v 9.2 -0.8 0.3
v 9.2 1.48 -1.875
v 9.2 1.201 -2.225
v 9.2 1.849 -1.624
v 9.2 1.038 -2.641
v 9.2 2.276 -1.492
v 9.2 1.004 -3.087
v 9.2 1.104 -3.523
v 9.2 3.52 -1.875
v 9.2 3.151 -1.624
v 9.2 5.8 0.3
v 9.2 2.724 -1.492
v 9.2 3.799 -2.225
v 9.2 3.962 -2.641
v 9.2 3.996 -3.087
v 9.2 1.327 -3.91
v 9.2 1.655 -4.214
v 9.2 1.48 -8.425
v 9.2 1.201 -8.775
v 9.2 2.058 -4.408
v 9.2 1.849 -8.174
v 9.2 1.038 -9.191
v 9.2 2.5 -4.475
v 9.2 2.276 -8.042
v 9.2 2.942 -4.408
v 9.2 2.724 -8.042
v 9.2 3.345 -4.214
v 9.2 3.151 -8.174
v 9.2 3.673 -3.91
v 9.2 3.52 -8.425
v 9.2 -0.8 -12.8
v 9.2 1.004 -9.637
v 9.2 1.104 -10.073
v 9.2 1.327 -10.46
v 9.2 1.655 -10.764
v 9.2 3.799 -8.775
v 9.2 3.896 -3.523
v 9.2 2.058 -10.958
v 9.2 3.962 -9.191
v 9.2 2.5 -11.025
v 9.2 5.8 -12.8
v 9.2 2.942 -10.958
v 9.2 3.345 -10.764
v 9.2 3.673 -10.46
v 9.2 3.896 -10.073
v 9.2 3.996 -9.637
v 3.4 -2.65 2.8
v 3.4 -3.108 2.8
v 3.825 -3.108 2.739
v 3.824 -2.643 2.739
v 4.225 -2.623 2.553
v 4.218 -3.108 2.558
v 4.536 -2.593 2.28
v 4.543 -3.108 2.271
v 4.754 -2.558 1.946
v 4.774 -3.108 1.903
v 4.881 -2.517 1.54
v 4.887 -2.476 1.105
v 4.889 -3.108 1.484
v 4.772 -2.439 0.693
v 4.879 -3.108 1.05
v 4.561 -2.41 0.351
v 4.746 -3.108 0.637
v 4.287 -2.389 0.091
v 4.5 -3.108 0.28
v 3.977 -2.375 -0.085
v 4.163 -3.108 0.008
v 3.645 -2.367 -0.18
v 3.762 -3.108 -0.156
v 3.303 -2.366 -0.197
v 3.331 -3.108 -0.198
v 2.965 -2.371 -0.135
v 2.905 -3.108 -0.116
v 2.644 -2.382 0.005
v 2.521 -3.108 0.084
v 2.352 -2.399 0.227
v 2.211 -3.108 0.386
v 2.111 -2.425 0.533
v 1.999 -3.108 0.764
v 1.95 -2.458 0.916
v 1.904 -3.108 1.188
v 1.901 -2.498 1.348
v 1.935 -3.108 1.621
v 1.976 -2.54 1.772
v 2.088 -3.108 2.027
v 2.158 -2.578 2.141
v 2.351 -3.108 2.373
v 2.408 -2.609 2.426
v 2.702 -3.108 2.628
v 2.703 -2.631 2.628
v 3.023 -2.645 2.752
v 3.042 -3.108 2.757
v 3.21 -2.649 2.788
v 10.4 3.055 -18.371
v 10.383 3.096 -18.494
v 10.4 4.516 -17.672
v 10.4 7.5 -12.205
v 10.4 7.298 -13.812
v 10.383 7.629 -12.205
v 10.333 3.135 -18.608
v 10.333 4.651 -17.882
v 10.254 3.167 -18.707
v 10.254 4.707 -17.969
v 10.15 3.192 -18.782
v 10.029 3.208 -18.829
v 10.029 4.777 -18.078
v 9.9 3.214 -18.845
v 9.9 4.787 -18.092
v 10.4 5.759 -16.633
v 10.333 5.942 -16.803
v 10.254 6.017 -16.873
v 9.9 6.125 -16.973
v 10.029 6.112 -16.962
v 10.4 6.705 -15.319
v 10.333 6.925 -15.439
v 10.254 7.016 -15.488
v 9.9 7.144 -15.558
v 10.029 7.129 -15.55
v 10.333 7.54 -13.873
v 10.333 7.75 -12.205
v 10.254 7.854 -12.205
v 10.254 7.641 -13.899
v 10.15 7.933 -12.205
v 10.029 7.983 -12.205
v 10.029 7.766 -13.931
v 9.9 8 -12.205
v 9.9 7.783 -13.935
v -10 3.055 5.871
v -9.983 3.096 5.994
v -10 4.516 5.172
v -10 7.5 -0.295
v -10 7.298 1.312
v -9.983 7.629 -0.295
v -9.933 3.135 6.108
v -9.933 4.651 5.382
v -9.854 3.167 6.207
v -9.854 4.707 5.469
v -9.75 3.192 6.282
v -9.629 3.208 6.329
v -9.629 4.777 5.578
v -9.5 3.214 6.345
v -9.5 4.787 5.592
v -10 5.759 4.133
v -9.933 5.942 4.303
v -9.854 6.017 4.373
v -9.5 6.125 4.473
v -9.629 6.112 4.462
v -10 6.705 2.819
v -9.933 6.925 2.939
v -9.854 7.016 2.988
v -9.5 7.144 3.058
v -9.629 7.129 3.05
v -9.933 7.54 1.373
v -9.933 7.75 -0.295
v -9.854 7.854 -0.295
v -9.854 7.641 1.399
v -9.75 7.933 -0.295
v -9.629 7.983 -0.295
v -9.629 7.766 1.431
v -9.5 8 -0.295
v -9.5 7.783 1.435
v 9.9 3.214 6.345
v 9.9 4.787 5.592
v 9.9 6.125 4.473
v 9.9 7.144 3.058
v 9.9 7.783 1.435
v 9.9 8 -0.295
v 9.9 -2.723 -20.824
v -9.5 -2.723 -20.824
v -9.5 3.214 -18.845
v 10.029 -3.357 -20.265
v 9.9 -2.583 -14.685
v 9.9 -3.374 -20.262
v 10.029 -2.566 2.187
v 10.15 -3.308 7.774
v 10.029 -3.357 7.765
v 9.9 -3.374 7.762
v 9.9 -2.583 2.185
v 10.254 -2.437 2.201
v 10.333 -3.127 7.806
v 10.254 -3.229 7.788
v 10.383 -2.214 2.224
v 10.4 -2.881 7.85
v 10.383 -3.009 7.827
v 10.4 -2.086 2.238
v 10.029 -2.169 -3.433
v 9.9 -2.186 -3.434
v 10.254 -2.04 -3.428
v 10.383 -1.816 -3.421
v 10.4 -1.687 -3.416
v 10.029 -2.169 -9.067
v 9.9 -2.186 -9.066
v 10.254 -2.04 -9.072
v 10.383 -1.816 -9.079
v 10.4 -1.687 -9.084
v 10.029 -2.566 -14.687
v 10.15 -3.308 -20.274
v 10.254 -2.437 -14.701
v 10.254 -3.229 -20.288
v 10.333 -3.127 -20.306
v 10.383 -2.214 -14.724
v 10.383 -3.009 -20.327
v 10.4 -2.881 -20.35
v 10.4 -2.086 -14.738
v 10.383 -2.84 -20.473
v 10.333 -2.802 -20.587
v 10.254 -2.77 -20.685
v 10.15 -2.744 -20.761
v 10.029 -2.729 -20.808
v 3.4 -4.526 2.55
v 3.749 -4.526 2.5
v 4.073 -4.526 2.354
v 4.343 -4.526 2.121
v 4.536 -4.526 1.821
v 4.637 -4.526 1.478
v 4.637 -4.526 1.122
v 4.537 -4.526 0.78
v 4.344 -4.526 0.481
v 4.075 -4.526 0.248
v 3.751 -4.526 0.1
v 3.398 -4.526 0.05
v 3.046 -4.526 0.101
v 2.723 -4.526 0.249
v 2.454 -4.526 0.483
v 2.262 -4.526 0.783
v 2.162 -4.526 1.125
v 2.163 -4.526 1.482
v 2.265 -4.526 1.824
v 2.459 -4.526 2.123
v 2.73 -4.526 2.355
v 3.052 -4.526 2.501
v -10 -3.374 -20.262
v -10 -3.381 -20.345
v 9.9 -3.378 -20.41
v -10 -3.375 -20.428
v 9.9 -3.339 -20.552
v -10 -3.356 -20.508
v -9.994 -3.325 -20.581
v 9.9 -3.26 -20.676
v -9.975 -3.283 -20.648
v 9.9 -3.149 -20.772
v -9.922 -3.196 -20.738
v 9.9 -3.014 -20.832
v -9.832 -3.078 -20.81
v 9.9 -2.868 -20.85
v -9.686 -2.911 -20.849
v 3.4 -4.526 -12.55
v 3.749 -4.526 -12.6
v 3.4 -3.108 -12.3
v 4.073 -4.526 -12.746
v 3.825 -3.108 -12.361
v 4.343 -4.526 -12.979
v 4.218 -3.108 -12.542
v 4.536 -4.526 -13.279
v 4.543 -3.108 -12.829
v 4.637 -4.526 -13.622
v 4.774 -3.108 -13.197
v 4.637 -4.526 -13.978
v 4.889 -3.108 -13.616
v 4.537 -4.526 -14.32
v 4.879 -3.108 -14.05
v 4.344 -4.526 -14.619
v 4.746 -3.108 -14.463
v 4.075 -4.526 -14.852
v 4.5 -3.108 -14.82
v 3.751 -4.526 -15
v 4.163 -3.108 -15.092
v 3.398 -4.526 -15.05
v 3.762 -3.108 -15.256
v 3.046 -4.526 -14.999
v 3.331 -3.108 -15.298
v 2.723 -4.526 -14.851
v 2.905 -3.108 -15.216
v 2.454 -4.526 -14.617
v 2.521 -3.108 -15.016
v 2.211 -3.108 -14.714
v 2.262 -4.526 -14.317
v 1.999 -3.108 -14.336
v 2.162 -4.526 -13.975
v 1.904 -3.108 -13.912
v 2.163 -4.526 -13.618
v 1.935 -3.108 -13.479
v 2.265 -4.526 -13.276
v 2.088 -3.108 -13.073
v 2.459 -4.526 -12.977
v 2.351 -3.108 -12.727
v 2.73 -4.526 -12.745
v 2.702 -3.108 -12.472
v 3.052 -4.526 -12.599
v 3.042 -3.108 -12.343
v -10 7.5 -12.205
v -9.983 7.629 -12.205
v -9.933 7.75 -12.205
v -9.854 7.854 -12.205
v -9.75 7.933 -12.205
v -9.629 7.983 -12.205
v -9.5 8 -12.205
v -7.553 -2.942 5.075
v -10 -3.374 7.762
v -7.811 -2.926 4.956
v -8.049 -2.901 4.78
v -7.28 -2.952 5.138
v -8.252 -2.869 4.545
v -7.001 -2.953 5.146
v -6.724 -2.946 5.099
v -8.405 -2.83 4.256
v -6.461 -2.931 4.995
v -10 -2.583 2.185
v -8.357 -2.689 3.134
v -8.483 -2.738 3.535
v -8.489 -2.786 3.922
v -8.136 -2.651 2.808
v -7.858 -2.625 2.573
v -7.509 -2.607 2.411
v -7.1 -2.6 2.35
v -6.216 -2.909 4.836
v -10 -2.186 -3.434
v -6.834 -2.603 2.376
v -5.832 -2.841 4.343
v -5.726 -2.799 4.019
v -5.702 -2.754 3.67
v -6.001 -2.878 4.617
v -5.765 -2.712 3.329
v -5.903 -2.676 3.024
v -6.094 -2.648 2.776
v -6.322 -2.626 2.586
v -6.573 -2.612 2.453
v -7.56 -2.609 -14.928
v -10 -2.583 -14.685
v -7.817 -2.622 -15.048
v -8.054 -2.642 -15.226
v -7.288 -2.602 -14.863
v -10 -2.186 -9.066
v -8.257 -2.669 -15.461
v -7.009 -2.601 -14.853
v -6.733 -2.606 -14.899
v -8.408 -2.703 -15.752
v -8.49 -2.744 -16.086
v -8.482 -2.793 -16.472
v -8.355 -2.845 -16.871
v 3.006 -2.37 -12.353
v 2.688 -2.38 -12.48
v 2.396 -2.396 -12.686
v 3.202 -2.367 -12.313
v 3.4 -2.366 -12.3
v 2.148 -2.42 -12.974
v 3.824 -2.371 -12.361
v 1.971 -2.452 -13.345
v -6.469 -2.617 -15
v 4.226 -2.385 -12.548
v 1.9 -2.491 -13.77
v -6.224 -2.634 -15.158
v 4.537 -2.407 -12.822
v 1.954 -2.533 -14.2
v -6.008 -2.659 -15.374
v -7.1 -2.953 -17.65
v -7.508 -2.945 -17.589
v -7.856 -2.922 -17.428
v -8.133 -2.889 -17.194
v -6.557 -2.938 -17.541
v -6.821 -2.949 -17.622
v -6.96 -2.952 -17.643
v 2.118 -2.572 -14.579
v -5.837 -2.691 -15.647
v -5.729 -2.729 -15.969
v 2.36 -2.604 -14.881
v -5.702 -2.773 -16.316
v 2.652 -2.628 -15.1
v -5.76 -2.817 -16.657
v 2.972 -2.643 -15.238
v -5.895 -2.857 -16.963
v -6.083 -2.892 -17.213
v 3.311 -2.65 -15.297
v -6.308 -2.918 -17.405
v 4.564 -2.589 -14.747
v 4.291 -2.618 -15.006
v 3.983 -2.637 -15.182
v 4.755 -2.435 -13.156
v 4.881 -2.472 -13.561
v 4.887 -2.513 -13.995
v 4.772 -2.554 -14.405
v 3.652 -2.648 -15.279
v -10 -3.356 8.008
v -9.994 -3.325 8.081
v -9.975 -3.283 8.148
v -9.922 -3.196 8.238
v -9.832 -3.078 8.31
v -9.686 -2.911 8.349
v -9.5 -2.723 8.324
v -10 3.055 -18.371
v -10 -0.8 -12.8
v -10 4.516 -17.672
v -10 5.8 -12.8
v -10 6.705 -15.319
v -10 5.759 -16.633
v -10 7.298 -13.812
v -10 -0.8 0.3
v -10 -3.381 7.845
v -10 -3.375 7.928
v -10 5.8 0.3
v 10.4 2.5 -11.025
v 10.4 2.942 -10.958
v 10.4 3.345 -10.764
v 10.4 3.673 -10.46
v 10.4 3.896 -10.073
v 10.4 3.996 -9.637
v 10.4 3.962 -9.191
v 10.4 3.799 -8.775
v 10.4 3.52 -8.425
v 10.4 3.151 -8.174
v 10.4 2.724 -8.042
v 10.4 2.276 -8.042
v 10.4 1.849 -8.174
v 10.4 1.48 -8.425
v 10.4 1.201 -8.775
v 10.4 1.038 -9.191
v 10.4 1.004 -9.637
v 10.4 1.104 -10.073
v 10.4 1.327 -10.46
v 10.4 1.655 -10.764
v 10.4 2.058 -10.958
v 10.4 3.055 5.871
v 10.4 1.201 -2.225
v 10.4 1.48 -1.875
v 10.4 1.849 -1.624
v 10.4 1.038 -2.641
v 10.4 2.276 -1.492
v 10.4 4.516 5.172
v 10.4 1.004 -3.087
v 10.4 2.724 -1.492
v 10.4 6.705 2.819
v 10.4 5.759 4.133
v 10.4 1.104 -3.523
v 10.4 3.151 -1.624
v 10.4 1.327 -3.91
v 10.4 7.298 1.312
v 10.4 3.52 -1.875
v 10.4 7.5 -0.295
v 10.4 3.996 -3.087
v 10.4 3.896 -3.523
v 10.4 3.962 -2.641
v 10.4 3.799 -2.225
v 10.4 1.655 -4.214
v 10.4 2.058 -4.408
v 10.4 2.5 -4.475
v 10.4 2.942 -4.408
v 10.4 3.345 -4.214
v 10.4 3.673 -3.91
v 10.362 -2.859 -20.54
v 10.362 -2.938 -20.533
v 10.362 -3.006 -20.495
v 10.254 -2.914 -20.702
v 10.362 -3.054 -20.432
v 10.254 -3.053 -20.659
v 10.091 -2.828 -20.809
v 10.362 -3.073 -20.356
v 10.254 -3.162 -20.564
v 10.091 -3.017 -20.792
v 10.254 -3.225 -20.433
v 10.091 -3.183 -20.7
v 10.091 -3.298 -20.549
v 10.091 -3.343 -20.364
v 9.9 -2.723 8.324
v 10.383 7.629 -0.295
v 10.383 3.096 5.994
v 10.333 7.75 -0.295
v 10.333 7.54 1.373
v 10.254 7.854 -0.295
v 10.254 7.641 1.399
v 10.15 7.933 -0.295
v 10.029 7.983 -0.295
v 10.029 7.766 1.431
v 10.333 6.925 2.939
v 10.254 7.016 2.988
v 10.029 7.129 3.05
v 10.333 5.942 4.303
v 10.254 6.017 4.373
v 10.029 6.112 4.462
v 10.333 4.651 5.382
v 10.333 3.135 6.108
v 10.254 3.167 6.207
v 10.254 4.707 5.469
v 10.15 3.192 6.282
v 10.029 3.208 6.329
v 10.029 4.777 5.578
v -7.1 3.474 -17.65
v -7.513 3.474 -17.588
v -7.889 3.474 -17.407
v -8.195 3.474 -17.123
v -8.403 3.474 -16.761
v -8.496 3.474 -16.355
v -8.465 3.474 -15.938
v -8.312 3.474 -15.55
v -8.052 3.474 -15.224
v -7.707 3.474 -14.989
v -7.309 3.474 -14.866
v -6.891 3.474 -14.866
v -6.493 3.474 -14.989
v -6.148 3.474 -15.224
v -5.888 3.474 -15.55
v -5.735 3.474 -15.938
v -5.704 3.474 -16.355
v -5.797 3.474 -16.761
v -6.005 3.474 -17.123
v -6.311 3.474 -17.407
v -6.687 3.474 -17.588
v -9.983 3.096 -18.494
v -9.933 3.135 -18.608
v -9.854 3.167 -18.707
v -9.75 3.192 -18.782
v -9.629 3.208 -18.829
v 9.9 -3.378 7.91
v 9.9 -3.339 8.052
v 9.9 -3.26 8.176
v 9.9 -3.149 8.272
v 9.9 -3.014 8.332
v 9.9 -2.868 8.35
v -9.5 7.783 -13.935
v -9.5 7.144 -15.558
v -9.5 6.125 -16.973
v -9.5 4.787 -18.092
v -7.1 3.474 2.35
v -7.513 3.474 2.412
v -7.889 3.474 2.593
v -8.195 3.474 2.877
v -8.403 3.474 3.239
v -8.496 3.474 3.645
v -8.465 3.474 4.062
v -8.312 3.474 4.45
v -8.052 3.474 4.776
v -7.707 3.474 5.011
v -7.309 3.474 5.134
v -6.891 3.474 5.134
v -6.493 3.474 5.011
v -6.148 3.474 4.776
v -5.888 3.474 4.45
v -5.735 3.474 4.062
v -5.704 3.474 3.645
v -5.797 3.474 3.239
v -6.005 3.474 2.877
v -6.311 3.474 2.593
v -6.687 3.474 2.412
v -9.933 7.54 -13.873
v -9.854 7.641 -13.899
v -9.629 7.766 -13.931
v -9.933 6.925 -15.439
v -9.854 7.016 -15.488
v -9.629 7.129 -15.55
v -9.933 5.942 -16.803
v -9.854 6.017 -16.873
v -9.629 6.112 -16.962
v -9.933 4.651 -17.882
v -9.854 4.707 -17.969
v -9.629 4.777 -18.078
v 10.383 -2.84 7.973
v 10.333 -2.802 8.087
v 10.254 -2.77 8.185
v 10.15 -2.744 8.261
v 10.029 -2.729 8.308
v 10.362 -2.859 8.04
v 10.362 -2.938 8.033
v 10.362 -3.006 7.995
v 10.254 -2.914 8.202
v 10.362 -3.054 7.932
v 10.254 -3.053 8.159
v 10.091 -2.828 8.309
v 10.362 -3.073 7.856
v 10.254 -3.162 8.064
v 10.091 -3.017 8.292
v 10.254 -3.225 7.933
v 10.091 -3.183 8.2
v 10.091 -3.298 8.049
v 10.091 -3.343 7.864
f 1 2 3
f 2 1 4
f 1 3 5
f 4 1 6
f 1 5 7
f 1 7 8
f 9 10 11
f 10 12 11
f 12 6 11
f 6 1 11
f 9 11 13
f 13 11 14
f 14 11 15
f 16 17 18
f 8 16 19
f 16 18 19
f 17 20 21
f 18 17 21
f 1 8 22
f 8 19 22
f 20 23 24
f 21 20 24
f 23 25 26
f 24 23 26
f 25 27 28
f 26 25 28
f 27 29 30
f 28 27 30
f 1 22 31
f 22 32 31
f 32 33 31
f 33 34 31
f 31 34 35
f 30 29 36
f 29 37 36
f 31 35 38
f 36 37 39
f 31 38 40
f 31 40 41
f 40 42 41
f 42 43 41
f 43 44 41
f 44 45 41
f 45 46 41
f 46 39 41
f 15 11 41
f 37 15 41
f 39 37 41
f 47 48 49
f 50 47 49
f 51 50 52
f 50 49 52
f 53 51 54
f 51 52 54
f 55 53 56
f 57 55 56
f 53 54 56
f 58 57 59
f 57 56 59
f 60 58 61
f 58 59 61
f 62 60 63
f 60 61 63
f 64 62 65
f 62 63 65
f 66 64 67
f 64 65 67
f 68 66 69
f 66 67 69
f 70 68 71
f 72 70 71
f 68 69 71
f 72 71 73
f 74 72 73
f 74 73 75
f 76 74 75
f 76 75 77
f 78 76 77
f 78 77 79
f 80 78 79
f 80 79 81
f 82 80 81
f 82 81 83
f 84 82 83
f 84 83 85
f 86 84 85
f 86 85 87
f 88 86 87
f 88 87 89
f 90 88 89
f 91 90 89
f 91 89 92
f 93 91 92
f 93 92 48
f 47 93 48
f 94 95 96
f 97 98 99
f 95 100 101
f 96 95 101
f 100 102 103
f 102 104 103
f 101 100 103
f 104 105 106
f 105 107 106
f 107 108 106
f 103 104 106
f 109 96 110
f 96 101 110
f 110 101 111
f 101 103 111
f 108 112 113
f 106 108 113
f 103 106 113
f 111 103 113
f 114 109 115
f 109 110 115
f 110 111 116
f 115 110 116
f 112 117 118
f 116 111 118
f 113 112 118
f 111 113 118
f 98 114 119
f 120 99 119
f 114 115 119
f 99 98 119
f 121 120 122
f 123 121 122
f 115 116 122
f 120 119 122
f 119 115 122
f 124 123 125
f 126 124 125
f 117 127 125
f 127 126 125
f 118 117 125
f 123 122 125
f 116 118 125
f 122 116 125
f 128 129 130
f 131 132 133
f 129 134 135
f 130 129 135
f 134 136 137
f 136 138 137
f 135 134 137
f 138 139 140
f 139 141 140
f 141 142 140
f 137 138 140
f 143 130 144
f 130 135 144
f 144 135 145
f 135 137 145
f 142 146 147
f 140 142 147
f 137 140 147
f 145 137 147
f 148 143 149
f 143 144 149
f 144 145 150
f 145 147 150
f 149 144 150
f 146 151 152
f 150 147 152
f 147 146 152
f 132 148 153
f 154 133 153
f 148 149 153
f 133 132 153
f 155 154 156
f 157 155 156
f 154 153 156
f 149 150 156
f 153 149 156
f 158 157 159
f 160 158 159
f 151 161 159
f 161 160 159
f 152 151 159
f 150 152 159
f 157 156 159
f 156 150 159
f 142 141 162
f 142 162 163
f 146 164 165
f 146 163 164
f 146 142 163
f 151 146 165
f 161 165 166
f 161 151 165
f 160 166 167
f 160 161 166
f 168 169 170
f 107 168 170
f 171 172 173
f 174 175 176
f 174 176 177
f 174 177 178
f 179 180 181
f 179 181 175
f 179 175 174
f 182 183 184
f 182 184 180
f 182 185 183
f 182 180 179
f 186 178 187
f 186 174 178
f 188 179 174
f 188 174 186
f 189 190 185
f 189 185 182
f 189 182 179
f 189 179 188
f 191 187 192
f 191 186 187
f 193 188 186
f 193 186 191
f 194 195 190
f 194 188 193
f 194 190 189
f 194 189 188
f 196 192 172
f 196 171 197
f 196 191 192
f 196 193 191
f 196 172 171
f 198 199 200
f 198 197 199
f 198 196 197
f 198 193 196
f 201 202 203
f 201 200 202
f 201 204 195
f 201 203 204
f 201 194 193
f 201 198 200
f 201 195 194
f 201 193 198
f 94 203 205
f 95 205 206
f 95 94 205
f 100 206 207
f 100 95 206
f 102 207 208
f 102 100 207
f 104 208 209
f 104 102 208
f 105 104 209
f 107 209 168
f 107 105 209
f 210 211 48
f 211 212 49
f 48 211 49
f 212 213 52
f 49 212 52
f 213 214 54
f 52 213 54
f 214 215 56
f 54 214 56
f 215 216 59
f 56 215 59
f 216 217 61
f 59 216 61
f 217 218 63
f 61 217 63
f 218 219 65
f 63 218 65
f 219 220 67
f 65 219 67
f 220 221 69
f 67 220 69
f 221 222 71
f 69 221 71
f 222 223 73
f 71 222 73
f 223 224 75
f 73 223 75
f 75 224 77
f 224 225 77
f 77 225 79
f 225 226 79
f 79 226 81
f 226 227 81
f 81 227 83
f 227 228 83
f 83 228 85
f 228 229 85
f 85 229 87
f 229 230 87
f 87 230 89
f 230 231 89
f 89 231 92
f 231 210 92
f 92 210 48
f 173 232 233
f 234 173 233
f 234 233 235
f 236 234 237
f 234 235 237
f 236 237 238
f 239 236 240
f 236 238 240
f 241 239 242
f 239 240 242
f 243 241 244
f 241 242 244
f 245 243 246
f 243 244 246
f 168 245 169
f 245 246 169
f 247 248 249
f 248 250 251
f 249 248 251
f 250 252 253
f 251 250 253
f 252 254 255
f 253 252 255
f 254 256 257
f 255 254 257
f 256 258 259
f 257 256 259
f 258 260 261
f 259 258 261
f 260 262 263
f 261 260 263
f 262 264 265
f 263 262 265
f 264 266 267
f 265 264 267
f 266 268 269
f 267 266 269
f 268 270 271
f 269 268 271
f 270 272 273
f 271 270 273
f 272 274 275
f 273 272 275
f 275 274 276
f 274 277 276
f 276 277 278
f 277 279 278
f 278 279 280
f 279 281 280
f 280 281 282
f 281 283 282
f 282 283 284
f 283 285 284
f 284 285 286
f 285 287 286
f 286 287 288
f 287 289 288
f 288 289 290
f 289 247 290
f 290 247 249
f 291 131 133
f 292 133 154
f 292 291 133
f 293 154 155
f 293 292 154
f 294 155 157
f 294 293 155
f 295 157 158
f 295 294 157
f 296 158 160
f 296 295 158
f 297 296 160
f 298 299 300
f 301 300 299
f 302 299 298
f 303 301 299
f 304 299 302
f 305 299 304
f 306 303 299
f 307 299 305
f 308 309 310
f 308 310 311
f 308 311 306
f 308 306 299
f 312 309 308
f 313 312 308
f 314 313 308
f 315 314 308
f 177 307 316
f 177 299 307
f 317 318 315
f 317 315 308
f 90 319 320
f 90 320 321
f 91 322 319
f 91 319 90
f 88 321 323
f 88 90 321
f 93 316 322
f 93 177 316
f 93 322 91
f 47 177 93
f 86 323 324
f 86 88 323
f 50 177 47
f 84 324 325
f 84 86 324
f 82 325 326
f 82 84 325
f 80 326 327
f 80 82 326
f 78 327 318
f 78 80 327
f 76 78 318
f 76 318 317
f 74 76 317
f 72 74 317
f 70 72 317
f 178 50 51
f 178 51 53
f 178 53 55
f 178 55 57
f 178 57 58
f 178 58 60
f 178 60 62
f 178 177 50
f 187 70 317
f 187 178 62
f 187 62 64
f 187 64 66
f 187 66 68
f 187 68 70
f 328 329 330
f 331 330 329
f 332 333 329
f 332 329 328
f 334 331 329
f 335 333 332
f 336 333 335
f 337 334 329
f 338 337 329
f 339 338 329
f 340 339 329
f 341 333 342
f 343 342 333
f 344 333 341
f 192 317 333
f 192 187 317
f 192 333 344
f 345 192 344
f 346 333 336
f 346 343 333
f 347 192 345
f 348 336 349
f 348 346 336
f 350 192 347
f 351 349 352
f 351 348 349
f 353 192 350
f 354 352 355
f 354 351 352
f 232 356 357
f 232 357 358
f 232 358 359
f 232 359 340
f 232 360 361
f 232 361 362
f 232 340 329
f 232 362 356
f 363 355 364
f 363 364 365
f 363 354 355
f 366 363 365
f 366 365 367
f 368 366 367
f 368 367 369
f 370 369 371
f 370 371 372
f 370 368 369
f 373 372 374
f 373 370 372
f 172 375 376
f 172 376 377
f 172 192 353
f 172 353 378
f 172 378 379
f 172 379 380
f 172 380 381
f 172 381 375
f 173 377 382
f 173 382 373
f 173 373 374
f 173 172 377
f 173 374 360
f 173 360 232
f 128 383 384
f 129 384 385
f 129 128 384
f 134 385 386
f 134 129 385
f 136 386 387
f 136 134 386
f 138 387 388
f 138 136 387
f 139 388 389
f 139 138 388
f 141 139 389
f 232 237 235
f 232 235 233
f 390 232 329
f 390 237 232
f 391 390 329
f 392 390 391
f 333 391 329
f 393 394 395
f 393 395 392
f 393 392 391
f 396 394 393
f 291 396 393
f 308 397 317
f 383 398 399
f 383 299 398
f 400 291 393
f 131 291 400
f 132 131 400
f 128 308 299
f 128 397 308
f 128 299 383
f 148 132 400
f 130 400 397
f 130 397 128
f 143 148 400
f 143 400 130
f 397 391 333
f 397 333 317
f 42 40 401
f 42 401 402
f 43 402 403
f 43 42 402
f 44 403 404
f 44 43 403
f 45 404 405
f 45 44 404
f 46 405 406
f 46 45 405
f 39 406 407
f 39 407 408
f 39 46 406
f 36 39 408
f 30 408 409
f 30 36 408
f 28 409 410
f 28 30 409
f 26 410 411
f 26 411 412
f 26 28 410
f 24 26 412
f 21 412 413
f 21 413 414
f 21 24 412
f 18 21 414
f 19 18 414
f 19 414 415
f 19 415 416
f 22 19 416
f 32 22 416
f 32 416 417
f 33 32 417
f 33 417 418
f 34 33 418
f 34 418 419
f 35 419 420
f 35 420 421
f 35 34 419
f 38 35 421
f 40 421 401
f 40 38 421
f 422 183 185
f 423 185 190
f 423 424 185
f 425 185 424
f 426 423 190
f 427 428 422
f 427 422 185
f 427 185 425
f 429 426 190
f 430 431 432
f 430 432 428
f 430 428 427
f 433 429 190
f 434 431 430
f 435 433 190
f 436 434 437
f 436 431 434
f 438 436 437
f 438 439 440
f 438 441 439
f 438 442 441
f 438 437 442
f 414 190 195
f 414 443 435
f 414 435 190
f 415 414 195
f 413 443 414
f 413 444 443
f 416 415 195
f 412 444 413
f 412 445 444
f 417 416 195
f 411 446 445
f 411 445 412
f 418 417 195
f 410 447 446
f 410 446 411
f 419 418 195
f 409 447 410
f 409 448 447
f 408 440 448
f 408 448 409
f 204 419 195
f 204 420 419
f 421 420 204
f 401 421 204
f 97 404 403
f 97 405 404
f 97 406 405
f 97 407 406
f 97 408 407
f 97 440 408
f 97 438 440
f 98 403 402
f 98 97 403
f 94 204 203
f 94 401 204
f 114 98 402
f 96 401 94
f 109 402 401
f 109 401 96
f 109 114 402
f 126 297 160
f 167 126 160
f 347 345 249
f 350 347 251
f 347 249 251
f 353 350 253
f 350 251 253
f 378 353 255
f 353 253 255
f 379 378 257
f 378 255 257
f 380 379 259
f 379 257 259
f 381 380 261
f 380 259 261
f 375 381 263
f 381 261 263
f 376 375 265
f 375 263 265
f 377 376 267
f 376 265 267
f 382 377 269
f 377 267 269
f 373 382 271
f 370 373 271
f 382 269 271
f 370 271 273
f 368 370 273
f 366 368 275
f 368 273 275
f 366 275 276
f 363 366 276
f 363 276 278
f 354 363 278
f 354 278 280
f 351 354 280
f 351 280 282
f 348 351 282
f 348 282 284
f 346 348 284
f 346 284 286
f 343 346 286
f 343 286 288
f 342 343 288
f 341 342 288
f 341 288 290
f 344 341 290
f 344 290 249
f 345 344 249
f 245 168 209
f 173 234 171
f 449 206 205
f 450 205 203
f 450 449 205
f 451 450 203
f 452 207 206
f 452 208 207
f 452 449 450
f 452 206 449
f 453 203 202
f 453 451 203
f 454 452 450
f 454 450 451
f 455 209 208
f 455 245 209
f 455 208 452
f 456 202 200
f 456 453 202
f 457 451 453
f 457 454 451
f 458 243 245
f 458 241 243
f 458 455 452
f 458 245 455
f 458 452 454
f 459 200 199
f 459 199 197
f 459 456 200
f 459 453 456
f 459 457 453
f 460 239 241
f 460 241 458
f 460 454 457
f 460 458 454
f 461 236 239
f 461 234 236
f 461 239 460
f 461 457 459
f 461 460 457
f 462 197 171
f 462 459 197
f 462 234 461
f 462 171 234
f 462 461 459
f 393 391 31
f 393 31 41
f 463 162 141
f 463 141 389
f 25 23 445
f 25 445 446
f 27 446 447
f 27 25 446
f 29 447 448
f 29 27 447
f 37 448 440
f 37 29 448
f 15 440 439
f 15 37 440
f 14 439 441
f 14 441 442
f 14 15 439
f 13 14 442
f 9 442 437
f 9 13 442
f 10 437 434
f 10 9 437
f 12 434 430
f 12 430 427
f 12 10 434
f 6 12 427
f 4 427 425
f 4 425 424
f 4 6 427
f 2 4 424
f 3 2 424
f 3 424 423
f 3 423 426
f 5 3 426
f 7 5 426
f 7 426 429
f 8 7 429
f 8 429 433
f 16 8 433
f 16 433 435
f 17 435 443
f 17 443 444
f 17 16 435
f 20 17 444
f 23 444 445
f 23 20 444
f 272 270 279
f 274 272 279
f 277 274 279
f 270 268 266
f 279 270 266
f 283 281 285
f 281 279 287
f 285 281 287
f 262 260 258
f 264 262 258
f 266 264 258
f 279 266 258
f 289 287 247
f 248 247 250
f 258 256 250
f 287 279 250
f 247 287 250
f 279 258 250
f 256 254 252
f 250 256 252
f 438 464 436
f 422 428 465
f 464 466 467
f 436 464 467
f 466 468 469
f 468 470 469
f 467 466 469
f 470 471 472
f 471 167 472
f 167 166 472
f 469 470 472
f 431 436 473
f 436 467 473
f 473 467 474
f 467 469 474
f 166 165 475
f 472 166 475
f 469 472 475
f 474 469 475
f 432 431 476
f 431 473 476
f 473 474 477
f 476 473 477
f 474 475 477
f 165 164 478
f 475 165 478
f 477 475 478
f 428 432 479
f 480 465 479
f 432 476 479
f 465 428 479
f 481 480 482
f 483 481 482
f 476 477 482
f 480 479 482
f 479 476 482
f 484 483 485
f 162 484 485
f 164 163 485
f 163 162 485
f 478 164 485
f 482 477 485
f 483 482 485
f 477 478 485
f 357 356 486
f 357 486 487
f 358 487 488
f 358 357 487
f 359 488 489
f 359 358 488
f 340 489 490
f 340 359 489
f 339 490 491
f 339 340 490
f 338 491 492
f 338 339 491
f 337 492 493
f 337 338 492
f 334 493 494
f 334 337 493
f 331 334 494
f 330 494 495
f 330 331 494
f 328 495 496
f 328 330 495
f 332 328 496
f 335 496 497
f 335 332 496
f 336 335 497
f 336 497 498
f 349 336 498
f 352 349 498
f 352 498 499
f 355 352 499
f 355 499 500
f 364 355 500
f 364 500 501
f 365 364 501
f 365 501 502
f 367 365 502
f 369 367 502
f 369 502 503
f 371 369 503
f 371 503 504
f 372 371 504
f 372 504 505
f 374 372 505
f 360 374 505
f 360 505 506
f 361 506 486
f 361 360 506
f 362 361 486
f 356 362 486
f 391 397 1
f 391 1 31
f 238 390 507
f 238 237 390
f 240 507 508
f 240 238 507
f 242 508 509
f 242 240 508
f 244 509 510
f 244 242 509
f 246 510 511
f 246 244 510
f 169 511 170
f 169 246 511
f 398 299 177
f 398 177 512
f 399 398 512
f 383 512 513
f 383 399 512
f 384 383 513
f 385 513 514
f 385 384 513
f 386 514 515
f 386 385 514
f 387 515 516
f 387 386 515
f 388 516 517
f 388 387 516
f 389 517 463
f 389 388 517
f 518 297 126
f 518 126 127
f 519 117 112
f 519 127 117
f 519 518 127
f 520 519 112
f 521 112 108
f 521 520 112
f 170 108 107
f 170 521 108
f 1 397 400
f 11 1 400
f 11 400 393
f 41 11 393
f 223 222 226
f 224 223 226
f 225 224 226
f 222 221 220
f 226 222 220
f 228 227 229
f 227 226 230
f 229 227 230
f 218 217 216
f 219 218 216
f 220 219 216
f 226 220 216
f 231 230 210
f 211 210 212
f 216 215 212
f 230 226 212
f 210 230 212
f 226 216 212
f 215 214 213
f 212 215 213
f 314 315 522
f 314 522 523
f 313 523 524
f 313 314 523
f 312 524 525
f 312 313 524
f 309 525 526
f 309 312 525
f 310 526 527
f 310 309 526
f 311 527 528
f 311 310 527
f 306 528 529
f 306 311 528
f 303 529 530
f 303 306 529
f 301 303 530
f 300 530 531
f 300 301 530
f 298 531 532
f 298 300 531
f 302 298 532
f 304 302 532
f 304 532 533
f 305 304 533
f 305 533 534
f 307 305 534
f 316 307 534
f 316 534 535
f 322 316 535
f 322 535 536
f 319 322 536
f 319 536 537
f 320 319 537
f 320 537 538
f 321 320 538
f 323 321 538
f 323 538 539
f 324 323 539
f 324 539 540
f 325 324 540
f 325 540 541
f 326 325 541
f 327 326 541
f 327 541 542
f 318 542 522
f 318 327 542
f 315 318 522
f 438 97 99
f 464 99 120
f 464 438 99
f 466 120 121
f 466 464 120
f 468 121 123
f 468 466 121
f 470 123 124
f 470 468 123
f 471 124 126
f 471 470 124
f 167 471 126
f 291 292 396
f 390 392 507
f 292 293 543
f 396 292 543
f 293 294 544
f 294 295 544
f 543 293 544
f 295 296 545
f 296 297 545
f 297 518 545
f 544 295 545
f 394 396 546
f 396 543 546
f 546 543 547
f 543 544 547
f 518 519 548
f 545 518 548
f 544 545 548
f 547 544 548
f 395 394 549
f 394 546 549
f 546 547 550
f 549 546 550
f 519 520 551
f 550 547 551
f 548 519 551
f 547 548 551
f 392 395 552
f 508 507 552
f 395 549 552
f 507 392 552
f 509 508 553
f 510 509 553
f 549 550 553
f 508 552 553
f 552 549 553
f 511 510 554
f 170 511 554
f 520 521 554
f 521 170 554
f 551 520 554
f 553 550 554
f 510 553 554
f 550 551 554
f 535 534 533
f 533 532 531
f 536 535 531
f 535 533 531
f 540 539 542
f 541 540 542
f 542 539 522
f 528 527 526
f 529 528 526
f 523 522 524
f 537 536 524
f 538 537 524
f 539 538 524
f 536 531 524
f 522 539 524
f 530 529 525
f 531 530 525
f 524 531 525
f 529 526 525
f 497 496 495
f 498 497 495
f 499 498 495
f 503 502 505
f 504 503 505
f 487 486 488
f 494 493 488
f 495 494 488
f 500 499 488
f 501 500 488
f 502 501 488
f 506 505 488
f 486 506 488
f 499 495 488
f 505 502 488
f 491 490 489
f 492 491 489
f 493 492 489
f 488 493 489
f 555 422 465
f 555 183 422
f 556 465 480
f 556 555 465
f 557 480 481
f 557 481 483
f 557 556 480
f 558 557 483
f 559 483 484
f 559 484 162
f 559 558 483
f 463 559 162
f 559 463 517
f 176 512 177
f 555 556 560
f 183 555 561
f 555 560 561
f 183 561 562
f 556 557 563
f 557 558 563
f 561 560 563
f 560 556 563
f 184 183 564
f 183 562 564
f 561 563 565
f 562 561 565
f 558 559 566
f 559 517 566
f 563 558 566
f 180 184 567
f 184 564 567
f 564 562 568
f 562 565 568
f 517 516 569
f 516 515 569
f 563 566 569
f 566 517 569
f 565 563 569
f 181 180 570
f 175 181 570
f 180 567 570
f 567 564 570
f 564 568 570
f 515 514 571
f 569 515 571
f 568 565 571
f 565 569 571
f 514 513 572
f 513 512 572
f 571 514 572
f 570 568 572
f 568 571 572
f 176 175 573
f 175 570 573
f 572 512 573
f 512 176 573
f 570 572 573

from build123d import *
from OCP.BRepFilletAPI import BRepFilletAPI_MakeChamfer

# Parameters (mm, degrees)
BOSS_EXTRUDE1_DEPTH             = 9.2
BOSS_EXTRUDE1_DEPTH_BACK        = 10
SKETCH1_W                       = 13.1
SKETCH1_H                       = 6.6
SKETCH2_W                       = 13.1
SKETCH2_H                       = 6.6
SKETCH2_R                       = 1.5
SKETCH2_W_2                     = 6.55
BOSS_EXTRUDE2_DEPTH             = 1.2
CUT_EXTRUDE1_DEPTH              = 20.4
FILLET1_R                       = 7
BOSS_EXTRUDE3_REACH             = 28.189
BOSS_EXTRUDE3_END_RADIUS        = 80
SKETCH4_R                       = 1.5
BOSS_EXTRUDE3_DIRECTION_2_DEPTH = 1
SKETCH5_R                       = 1.4
CUT_EXTRUDE2_DEPTH              = 7
CHAMFER1_SIZE                   = 0.25
CHAMFER1_SIZE2                  = 1.417820455
FILLET2_R                       = 0.5


with BuildPart() as part:
    # Sketch1 → Boss-Extrude1 (new, two sides: drawn at the far end of the back side and taken through both)
    with BuildSketch(Plane(origin=(0, 0, 0), x_dir=(0, 0, -1), z_dir=(1, 0, 0)).offset(-BOSS_EXTRUDE1_DEPTH_BACK)):
        Polygon((-8.75, -4), (-4.75, 8), (17.25, 8), (21.25, -4), align=None)
        with Locations((6.25, 2.5)):
            Rectangle(SKETCH1_W, SKETCH1_H, mode=Mode.SUBTRACT)
    extrude(amount=BOSS_EXTRUDE1_DEPTH + BOSS_EXTRUDE1_DEPTH_BACK)

    # Sketch2 → Boss-Extrude2 (add)
    # profile 1 of 3: a face of its own
    with BuildSketch(Plane(origin=(9.2, 0, 0), x_dir=(0, 0, -1), z_dir=(1, 0, 0))):
        Polygon((-4.75, 8), (-8.75, -4), (21.25, -4), (17.25, 8), align=None)
        with Locations((6.25, 2.5)):
            Rectangle(SKETCH2_W, SKETCH2_H, mode=Mode.SUBTRACT)
    # profile 2 of 3: a face of its own
    with BuildSketch(Plane(origin=(9.2, 0, 0), x_dir=(0, 0, -1), z_dir=(1, 0, 0))):
        with Locations((6.25, 2.5)):
            Rectangle(SKETCH2_W, SKETCH2_H)
        with Locations((2.975, 2.5)):
            Circle(SKETCH2_R, mode=Mode.SUBTRACT)
        with Locations((9.525, 2.5)):
            Circle(SKETCH2_R, mode=Mode.SUBTRACT)
    # profile 3 of 3: a face of its own
    with BuildSketch(Plane(origin=(9.2, 0, 0), x_dir=(0, 0, -1), z_dir=(1, 0, 0))):
        with Locations((9.525, 2.5)):
            Rectangle(SKETCH2_W_2, SKETCH2_H)
        with Locations((9.525, 2.5)):
            Circle(SKETCH2_R, mode=Mode.SUBTRACT)
    extrude(amount=BOSS_EXTRUDE2_DEPTH)

    # Sketch3 → Cut-Extrude1 (cut)
    with BuildSketch(Plane(origin=(10.4, 0, 0), x_dir=(0, 0, -1), z_dir=(1, 0, 0))):
        with BuildLine():
            Line((21.091886117, -3.525658351), (21.25, -4))
            Line((21.25, -4), (-8.75, -4))
            Line((-8.75, -4), (-8.591886117, -3.525658351))
            ThreePointArc((-8.591886117, -3.525658351), (6.25, -2.136843411), (21.091886117, -3.525658351))
        make_face()
    extrude(amount=-CUT_EXTRUDE1_DEPTH, mode=Mode.SUBTRACT)

    # Fillet1
    fillet1_edges = [part.edges().sort_by_distance(p)[0] for p in [
        (0.2, 8, 4.75),
        (0.2, 8, -17.25),
    ]]
    fillet(fillet1_edges, radius=FILLET1_R)

    # Boss-Extrude3: up to this cylinder (the profile starts inside it)
    boss_extrude3_end = Plane(origin=(3.4, -82.136843411, -6.25), z_dir=(1, 0, 0)) * Cylinder(BOSS_EXTRUDE3_END_RADIUS, 217.378, mode=Mode.PRIVATE)
    # Sketch4 → Boss-Extrude3 (add, up to the surface)
    with BuildSketch(Plane(origin=(0, -3.525658351, 0), x_dir=(1, 0, 0), z_dir=(0, 1, 0)), mode=Mode.PRIVATE) as boss_extrude3_sk1:
        with Locations(Location((3.4, 13.8, 0), (0, 0, 270))):
            Circle(SKETCH4_R)
    boss_extrude3_tool1 = extrude(boss_extrude3_sk1.sketch, amount=BOSS_EXTRUDE3_REACH, mode=Mode.PRIVATE) & boss_extrude3_end
    add(boss_extrude3_tool1.solids().sort_by_distance((3.4, -3.525658, -13.8))[0])
    # Sketch4 → Boss-Extrude3 (add, up to the surface)
    with BuildSketch(Plane(origin=(0, -3.525658351, 0), x_dir=(1, 0, 0), z_dir=(0, 1, 0)), mode=Mode.PRIVATE) as boss_extrude3_sk2:
        with Locations(Location((3.4, -1.3, 0), (0, 0, 270))):
            Circle(SKETCH4_R)
    boss_extrude3_tool2 = extrude(boss_extrude3_sk2.sketch, amount=BOSS_EXTRUDE3_REACH, mode=Mode.PRIVATE) & boss_extrude3_end
    add(boss_extrude3_tool2.solids().sort_by_distance((3.4, -3.525658, 1.3))[0])

    # Sketch4 → Boss-Extrude3 direction 2 (add)
    with BuildSketch(Plane(origin=(0, -3.525658351, 0), x_dir=(1, 0, 0), z_dir=(0, 1, 0))):
        with Locations(Location((3.4, 13.8, 0), (0, 0, 270))):
            Circle(SKETCH4_R)
        with Locations(Location((3.4, -1.3, 0), (0, 0, 270))):
            Circle(SKETCH4_R)
    extrude(amount=-BOSS_EXTRUDE3_DIRECTION_2_DEPTH)

    # Sketch5 → Cut-Extrude2 (cut)
    with BuildSketch(Plane(origin=(0, -3.525658351, 0), x_dir=(1, 0, 0), z_dir=(0, 1, 0))):
        with Locations(Location((-7.1, 16.25, 0), (0, 0, 90))):
            Circle(SKETCH5_R)
        with Locations(Location((-7.1, -3.75, 0), (0, 0, 90))):
            Circle(SKETCH5_R)
    extrude(amount=CUT_EXTRUDE2_DEPTH, mode=Mode.SUBTRACT)

    # Chamfer1: one chamfer whose edges measure the first distance from different faces: ONE call of the kernel's chamfer builder (chamfer() names one face for all edges)
    chamfer1_edges_1 = [part.edges().sort_by_distance(p)[0] for p in [
        (3.4, -4.525658351, -0.2),
    ]]
    chamfer1_side_1 = [part.faces().sort_by_distance(p)[0] for p in [
        (3.4, -4.525658351, 1.3),
    ]]
    chamfer1_edges_2 = [part.edges().sort_by_distance(p)[0] for p in [
        (3.4, -4.525658351, -15.3),
    ]]
    chamfer1_side_2 = [part.faces().sort_by_distance(p)[0] for p in [
        (3.4, -4.525658351, -13.8),
    ]]
    chamfer1 = BRepFilletAPI_MakeChamfer(part.part.solid().wrapped)
    for e in chamfer1_edges_1:
        chamfer1.Add(CHAMFER1_SIZE, CHAMFER1_SIZE2, e.wrapped, chamfer1_side_1[0].wrapped)  # the first distance lies on this face
    for e in chamfer1_edges_2:
        chamfer1.Add(CHAMFER1_SIZE, CHAMFER1_SIZE2, e.wrapped, chamfer1_side_2[0].wrapped)  # the first distance lies on this face
    add(Compound.cast(chamfer1.Shape()), mode=Mode.REPLACE)

    # Fillet2
    fillet2_edges = [part.edges().sort_by_distance(p)[0] for p in [
        (10.4, -0.156031994, -19.968677331),
        (-10, -0.156031994, -19.968677331),
        (10.4, -2.136843411, -6.25),
        (0.2, -3.525658351, -21.091886117),
        (0.2, -3.525658351, 8.591886117),
        (10.4, 8, -6.25),
        (10.4, -0.156031994, 7.468677331),
        (10.4, 6.678695296, 3.797657452),
        (10.4, 6.678695296, -16.297657452),
        (-10, 8, -6.25),
        (-10, -0.156031994, 7.468677331),
        (-10, 6.678695296, 3.797657452),
        (-10, 6.678695296, -16.297657452),
    ]]
    fillet(fillet2_edges, radius=FILLET2_R)


solid = part.part
